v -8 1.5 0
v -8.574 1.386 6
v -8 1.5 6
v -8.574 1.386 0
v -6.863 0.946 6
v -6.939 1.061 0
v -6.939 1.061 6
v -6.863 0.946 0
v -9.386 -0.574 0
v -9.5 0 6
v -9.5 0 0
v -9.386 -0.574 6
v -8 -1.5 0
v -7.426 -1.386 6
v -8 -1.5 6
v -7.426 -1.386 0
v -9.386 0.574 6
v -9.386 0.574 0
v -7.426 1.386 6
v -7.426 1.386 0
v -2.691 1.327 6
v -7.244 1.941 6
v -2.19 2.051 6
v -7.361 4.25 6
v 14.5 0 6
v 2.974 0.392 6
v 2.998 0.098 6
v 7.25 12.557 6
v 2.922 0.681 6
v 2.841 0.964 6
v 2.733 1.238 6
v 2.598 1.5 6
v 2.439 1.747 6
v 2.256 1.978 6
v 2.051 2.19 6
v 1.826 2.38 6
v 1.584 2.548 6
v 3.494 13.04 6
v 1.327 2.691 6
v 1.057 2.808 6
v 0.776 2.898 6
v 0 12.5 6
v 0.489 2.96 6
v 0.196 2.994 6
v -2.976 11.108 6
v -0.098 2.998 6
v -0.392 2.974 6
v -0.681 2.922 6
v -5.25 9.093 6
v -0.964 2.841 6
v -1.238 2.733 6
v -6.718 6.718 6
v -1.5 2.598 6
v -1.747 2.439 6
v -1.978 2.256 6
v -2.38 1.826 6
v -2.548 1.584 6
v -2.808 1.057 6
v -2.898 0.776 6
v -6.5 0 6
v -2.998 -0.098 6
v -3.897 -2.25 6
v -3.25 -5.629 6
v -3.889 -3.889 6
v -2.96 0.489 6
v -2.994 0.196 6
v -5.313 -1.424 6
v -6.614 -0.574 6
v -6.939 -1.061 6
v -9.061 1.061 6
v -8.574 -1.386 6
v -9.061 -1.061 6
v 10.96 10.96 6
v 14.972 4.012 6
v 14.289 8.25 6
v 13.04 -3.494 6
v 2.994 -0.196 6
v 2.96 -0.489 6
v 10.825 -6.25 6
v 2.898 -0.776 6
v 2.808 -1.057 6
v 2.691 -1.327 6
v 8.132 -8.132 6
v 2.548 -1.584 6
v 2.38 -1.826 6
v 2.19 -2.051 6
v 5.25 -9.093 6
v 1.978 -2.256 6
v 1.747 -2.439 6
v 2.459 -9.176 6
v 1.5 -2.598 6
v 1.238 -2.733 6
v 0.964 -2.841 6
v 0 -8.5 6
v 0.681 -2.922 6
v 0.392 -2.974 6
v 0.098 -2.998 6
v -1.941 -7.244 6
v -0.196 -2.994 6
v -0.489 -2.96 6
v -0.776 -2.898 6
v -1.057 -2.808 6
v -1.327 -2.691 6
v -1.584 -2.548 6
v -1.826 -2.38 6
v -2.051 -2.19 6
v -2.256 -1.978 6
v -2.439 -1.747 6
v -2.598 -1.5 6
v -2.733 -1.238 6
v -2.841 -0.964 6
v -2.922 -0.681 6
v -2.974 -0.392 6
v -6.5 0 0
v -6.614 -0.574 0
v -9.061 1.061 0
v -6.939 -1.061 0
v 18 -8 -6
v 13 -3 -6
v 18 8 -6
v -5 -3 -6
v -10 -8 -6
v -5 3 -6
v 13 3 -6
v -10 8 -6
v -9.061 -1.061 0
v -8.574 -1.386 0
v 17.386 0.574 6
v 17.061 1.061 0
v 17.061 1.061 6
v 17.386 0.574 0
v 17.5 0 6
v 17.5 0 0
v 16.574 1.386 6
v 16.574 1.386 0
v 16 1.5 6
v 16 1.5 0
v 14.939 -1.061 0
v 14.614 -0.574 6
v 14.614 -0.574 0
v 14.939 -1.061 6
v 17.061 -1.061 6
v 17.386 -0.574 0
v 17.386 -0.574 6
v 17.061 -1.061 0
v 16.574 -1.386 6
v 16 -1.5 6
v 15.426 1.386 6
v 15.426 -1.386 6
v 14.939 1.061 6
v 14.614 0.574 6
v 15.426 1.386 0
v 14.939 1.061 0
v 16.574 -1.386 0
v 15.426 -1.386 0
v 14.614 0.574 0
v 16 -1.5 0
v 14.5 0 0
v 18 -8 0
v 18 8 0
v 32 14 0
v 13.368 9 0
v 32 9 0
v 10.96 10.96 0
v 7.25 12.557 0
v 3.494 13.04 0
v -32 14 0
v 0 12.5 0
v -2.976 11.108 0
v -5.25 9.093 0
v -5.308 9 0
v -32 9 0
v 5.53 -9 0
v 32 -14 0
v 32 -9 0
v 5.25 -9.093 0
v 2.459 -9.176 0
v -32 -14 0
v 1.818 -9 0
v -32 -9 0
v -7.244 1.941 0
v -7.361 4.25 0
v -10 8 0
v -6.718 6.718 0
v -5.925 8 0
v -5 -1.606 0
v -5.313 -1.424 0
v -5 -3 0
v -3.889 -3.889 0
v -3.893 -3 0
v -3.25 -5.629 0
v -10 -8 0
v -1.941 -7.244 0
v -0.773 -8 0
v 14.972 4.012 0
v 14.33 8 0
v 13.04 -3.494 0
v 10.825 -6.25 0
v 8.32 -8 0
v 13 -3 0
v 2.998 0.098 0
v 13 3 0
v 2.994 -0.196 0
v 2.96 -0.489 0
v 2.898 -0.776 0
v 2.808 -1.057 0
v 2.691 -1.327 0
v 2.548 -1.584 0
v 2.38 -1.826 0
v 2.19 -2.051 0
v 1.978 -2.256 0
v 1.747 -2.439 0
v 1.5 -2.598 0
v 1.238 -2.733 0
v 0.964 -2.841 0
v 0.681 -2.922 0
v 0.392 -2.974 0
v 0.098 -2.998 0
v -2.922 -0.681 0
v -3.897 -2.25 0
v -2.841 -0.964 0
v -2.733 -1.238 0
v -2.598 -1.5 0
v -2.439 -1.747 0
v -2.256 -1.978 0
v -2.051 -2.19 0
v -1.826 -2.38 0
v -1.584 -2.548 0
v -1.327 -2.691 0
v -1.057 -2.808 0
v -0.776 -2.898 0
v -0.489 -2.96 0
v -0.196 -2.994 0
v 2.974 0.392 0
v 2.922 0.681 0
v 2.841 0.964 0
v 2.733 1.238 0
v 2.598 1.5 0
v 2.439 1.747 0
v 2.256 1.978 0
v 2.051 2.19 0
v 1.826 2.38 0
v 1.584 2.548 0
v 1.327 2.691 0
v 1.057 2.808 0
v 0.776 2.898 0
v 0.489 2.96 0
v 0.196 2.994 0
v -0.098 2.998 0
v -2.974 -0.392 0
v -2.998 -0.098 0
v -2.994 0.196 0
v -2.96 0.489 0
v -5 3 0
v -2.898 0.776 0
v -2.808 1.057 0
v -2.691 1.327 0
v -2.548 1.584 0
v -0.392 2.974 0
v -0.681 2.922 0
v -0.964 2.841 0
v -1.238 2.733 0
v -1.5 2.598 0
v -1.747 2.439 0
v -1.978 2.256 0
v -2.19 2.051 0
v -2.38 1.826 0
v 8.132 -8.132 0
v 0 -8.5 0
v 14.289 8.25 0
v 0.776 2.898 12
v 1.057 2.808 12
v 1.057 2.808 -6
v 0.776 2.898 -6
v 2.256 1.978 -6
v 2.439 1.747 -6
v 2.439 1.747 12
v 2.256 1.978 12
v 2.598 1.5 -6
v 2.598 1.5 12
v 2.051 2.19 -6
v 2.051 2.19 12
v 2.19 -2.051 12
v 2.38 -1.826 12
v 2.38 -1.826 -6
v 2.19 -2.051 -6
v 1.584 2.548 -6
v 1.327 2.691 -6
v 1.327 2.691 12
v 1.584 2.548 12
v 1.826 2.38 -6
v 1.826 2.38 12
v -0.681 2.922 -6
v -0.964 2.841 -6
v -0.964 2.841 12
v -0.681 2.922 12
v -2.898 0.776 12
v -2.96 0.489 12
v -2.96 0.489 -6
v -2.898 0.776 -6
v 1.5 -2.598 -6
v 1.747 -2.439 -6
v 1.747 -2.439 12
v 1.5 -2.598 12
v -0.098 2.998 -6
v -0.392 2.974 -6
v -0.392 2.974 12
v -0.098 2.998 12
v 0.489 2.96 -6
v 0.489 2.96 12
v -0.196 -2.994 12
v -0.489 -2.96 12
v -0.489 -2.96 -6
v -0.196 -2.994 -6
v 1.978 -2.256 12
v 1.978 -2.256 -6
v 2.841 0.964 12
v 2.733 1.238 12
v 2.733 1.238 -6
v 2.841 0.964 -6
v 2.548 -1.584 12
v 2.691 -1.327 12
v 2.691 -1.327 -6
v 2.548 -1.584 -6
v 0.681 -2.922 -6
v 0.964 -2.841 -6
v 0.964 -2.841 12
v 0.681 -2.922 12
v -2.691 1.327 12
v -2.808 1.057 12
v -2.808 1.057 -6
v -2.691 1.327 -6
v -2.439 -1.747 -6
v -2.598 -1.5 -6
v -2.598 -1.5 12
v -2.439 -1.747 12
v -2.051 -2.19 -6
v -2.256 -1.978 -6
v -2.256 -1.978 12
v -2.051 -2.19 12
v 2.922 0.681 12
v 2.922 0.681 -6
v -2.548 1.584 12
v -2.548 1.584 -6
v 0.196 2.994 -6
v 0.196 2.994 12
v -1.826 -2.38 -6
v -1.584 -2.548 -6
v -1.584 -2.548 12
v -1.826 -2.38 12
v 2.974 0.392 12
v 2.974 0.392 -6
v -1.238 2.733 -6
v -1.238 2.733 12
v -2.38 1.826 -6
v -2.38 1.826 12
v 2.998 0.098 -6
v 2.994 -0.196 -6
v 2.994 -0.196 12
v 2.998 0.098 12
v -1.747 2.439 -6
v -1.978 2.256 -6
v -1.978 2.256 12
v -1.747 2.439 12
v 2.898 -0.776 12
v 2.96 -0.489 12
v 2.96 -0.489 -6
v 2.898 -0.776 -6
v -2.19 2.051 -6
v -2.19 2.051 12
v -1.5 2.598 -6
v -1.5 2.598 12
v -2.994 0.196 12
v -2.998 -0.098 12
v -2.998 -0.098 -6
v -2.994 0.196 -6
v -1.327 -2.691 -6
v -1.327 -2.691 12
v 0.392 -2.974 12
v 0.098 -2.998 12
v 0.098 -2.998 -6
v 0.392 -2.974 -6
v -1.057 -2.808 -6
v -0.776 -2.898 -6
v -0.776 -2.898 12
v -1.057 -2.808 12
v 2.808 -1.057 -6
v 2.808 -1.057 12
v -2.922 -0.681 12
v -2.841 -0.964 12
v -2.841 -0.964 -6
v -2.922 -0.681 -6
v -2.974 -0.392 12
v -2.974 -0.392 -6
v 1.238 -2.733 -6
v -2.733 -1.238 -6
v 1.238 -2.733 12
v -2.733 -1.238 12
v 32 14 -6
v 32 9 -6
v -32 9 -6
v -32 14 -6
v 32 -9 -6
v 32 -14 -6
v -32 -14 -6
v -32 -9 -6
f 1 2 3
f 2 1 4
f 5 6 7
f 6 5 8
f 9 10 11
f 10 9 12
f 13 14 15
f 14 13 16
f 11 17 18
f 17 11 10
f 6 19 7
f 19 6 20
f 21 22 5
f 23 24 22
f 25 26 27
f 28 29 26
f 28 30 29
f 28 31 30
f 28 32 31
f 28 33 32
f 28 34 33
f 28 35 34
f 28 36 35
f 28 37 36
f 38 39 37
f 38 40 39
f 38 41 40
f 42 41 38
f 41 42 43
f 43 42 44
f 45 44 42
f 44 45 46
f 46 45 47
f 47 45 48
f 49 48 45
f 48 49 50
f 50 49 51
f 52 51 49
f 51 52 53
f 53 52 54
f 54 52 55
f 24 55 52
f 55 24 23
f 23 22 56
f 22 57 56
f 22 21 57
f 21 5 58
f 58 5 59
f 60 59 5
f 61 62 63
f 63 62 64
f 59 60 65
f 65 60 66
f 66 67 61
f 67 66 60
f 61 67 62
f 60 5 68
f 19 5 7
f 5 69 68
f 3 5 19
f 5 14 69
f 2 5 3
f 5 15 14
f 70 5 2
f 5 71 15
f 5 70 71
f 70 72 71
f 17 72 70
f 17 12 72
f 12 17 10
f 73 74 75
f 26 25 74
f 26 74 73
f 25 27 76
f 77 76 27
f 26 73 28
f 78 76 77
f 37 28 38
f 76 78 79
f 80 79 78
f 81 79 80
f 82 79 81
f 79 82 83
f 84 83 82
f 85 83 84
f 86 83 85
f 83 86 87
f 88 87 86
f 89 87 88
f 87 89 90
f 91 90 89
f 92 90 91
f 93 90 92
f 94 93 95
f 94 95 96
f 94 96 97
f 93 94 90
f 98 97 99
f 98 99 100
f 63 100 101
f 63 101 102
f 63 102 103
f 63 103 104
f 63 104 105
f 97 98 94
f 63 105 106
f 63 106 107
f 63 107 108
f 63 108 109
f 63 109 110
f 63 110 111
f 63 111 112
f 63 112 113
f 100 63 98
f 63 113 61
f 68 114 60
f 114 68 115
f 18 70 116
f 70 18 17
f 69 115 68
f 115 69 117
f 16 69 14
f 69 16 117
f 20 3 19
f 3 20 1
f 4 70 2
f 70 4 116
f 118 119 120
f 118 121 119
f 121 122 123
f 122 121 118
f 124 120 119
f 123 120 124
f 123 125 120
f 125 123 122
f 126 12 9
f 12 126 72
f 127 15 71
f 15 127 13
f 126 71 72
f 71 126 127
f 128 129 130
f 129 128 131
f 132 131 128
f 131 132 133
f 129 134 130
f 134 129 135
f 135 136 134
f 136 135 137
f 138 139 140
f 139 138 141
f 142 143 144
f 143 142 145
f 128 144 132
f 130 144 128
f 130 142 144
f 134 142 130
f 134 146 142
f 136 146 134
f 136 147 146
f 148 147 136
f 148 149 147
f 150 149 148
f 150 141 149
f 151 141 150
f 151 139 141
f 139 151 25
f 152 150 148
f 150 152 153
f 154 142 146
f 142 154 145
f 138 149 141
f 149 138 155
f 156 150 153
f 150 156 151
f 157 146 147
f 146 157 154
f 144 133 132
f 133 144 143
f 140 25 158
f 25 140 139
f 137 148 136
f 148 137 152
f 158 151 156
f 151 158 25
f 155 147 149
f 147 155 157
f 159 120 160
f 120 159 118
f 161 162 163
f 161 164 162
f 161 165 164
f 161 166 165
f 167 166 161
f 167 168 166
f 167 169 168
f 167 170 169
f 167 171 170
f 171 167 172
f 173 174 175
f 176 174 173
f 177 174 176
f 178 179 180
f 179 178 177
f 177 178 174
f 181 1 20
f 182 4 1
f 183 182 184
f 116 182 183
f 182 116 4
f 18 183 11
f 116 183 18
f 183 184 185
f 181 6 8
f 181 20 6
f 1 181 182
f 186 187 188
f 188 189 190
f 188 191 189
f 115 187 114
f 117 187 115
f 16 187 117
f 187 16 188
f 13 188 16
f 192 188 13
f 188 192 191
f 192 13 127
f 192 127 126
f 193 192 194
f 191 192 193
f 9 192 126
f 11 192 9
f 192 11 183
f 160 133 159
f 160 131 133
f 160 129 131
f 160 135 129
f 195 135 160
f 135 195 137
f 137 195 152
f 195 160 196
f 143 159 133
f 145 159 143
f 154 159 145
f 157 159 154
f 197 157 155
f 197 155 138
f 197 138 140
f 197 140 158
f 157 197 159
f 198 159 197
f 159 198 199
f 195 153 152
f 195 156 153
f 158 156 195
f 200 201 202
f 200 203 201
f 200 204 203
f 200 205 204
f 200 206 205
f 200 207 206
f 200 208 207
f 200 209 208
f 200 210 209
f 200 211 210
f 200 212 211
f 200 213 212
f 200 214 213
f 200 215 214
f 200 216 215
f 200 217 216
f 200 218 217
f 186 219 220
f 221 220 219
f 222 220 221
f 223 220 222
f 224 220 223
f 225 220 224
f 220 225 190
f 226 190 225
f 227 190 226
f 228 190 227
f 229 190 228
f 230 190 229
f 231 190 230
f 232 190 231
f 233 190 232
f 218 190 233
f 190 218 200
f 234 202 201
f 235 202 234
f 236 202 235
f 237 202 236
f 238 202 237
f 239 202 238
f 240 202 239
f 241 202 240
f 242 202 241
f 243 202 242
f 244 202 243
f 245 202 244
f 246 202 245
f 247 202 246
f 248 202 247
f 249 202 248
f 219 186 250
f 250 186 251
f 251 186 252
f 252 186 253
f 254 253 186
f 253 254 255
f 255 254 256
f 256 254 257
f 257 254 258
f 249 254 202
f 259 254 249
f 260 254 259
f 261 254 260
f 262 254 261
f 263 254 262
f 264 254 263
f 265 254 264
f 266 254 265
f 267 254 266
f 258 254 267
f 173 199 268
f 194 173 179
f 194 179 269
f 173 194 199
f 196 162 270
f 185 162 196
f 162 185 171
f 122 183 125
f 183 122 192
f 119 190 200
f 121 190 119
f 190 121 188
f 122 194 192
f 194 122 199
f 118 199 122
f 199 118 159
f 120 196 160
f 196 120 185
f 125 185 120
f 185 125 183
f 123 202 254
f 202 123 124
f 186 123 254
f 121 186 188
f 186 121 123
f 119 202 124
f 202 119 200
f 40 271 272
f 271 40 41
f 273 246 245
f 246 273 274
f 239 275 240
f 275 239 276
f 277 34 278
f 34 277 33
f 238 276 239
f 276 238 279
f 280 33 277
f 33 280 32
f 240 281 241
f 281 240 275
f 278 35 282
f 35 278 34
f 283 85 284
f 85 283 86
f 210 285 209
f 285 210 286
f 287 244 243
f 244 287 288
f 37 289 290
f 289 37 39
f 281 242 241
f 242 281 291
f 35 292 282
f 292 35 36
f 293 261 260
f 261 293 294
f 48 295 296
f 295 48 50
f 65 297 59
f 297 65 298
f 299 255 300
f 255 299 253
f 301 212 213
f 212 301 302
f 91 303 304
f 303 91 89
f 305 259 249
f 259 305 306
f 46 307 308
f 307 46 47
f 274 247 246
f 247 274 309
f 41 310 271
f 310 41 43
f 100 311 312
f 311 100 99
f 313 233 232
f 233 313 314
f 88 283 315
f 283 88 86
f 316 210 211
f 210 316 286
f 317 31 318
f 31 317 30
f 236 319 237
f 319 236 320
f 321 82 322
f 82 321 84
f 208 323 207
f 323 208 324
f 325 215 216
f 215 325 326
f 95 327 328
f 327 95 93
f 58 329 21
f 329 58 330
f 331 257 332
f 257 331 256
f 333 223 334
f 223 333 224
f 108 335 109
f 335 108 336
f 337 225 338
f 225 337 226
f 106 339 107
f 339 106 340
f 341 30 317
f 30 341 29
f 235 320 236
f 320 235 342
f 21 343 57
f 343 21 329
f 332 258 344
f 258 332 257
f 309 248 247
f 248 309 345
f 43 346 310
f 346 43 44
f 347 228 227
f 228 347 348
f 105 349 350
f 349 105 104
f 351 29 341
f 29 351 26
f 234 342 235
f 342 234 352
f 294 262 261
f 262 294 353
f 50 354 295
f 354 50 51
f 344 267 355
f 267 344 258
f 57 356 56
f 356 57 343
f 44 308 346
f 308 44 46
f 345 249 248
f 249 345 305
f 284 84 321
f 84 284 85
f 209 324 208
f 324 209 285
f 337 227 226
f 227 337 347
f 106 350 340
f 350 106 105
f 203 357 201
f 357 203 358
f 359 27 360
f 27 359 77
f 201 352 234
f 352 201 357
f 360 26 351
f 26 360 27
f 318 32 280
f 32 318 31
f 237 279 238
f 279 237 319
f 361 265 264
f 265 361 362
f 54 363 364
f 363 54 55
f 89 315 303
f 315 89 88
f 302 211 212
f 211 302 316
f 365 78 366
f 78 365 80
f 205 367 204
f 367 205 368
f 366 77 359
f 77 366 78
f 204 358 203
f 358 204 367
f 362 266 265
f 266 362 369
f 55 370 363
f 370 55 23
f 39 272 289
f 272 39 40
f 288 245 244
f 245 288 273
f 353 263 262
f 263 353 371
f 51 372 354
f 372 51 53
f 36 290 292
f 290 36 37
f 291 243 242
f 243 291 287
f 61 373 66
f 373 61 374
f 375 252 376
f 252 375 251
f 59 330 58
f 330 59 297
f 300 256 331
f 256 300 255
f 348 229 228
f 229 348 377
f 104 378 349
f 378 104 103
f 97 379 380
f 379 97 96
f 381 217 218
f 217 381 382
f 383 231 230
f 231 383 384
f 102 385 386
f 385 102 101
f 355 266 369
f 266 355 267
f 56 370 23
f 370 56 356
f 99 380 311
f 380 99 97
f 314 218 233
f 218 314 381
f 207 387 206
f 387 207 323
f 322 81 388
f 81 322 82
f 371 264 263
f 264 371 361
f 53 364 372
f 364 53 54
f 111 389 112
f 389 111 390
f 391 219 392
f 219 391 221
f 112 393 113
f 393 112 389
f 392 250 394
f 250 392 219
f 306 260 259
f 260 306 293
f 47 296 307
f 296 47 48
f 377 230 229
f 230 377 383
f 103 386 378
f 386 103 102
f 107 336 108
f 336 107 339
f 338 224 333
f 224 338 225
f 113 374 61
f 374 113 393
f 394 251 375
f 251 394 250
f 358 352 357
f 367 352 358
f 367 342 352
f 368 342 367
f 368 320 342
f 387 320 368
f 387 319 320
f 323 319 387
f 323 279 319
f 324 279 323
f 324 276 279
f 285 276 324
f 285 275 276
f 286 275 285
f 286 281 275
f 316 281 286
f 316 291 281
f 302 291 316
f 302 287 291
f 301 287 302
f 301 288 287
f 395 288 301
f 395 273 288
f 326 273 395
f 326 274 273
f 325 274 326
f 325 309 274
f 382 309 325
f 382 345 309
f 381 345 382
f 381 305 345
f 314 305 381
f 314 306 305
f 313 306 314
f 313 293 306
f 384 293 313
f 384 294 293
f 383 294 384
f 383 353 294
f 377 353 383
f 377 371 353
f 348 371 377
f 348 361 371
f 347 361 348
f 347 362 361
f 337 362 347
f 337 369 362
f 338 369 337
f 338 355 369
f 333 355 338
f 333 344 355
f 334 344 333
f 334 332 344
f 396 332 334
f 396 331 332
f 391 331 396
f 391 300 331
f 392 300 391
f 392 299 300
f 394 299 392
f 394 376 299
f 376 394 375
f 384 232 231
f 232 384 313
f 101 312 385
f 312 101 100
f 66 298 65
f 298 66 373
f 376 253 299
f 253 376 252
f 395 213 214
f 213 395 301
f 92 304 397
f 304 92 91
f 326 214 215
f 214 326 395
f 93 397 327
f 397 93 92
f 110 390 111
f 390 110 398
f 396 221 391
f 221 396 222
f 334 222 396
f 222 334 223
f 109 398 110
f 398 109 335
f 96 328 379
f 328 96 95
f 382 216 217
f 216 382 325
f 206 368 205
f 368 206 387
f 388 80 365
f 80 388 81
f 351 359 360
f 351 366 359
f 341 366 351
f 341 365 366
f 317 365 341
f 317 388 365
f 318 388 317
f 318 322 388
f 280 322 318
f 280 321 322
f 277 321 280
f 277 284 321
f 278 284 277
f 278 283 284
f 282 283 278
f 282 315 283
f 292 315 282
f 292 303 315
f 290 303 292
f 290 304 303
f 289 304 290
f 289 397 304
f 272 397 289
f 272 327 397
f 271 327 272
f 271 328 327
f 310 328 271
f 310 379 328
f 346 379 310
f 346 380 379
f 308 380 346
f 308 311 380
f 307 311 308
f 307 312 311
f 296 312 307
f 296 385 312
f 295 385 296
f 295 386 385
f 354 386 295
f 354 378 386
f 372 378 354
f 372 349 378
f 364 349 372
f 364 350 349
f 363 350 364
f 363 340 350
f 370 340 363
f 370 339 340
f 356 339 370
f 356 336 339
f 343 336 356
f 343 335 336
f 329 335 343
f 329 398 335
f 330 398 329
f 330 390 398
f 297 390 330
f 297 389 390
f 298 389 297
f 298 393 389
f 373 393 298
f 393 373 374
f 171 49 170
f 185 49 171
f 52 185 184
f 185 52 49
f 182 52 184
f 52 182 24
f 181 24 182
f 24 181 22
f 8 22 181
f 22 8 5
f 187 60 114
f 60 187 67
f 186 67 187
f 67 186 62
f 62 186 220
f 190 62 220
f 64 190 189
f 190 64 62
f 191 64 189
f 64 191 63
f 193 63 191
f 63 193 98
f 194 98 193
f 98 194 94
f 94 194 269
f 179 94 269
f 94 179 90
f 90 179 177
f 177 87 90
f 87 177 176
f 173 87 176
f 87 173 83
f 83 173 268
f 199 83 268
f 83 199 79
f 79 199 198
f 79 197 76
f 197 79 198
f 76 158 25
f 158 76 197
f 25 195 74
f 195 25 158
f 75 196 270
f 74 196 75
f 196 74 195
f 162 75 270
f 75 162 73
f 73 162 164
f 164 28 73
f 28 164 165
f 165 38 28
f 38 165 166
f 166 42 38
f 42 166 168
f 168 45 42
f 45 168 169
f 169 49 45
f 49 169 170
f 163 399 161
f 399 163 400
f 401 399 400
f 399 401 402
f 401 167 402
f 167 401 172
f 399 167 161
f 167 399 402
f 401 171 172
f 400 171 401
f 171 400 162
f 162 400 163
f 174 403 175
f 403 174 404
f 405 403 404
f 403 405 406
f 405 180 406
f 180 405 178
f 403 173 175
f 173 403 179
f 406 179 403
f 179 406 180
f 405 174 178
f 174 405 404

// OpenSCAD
$time = 30;

h=6;
cr = 9;
mr = 6;
fw = 5;

pin_rad = 1.5;

module heart_cam(r, R, h) {
	min_r = r - pin_rad;
	max_r = R - pin_rad;
	steps = 24;
	step_angle = 360 / steps;

	points = [
		for (i = [0 : steps - 1])
		let(
			angle = i * step_angle,
			r = max_r - (max_r - min_r) * 2 * abs(i - steps/2) / steps
		)
		[r * cos(angle), r * sin(angle)]
	];

	linear_extrude(height = h) {
		polygon(points);
	}
}

module OF(){
    translate([-6,0,-h])cylinder(r=pin_rad,h=h*2,$fn=16);    translate([18,0,-h])cylinder(r=pin_rad,h=h*2,$fn=16);
    
    translate([-fw-(cr-mr),-3-fw,-h])cube([fw*2+cr*2,fw,h]);
    translate([-fw-(cr-mr),3,-h])cube([fw*2+cr*2,fw,h]);
    translate([-fw-(cr-mr),-(3+fw),-h])cube([fw,6+fw*2,h]);
    translate([(cr+mr),-(3+fw),-h])cube([fw,6+fw*2,h]);
}
    


module OC(){
    translate([0,0,-h])cylinder(r=3,h=h*3,$fn=64);

    rotate([0,0,180]) heart_cam(6, 18, h);
}


translate([-fw-(cr-mr)-mr*4,3+fw+1,-h])cube([fw*2+cr*2+mr*6,fw,h]);
translate([-fw-(cr-mr)-mr*4,-3-2*fw-1,-h])cube([fw*2+cr*2+mr*6,fw,h]);
dx = 12 *(180 - abs($time-180))/180;
translate([-dx,0,0])OF();
rotate([0,0,$time])OC();
